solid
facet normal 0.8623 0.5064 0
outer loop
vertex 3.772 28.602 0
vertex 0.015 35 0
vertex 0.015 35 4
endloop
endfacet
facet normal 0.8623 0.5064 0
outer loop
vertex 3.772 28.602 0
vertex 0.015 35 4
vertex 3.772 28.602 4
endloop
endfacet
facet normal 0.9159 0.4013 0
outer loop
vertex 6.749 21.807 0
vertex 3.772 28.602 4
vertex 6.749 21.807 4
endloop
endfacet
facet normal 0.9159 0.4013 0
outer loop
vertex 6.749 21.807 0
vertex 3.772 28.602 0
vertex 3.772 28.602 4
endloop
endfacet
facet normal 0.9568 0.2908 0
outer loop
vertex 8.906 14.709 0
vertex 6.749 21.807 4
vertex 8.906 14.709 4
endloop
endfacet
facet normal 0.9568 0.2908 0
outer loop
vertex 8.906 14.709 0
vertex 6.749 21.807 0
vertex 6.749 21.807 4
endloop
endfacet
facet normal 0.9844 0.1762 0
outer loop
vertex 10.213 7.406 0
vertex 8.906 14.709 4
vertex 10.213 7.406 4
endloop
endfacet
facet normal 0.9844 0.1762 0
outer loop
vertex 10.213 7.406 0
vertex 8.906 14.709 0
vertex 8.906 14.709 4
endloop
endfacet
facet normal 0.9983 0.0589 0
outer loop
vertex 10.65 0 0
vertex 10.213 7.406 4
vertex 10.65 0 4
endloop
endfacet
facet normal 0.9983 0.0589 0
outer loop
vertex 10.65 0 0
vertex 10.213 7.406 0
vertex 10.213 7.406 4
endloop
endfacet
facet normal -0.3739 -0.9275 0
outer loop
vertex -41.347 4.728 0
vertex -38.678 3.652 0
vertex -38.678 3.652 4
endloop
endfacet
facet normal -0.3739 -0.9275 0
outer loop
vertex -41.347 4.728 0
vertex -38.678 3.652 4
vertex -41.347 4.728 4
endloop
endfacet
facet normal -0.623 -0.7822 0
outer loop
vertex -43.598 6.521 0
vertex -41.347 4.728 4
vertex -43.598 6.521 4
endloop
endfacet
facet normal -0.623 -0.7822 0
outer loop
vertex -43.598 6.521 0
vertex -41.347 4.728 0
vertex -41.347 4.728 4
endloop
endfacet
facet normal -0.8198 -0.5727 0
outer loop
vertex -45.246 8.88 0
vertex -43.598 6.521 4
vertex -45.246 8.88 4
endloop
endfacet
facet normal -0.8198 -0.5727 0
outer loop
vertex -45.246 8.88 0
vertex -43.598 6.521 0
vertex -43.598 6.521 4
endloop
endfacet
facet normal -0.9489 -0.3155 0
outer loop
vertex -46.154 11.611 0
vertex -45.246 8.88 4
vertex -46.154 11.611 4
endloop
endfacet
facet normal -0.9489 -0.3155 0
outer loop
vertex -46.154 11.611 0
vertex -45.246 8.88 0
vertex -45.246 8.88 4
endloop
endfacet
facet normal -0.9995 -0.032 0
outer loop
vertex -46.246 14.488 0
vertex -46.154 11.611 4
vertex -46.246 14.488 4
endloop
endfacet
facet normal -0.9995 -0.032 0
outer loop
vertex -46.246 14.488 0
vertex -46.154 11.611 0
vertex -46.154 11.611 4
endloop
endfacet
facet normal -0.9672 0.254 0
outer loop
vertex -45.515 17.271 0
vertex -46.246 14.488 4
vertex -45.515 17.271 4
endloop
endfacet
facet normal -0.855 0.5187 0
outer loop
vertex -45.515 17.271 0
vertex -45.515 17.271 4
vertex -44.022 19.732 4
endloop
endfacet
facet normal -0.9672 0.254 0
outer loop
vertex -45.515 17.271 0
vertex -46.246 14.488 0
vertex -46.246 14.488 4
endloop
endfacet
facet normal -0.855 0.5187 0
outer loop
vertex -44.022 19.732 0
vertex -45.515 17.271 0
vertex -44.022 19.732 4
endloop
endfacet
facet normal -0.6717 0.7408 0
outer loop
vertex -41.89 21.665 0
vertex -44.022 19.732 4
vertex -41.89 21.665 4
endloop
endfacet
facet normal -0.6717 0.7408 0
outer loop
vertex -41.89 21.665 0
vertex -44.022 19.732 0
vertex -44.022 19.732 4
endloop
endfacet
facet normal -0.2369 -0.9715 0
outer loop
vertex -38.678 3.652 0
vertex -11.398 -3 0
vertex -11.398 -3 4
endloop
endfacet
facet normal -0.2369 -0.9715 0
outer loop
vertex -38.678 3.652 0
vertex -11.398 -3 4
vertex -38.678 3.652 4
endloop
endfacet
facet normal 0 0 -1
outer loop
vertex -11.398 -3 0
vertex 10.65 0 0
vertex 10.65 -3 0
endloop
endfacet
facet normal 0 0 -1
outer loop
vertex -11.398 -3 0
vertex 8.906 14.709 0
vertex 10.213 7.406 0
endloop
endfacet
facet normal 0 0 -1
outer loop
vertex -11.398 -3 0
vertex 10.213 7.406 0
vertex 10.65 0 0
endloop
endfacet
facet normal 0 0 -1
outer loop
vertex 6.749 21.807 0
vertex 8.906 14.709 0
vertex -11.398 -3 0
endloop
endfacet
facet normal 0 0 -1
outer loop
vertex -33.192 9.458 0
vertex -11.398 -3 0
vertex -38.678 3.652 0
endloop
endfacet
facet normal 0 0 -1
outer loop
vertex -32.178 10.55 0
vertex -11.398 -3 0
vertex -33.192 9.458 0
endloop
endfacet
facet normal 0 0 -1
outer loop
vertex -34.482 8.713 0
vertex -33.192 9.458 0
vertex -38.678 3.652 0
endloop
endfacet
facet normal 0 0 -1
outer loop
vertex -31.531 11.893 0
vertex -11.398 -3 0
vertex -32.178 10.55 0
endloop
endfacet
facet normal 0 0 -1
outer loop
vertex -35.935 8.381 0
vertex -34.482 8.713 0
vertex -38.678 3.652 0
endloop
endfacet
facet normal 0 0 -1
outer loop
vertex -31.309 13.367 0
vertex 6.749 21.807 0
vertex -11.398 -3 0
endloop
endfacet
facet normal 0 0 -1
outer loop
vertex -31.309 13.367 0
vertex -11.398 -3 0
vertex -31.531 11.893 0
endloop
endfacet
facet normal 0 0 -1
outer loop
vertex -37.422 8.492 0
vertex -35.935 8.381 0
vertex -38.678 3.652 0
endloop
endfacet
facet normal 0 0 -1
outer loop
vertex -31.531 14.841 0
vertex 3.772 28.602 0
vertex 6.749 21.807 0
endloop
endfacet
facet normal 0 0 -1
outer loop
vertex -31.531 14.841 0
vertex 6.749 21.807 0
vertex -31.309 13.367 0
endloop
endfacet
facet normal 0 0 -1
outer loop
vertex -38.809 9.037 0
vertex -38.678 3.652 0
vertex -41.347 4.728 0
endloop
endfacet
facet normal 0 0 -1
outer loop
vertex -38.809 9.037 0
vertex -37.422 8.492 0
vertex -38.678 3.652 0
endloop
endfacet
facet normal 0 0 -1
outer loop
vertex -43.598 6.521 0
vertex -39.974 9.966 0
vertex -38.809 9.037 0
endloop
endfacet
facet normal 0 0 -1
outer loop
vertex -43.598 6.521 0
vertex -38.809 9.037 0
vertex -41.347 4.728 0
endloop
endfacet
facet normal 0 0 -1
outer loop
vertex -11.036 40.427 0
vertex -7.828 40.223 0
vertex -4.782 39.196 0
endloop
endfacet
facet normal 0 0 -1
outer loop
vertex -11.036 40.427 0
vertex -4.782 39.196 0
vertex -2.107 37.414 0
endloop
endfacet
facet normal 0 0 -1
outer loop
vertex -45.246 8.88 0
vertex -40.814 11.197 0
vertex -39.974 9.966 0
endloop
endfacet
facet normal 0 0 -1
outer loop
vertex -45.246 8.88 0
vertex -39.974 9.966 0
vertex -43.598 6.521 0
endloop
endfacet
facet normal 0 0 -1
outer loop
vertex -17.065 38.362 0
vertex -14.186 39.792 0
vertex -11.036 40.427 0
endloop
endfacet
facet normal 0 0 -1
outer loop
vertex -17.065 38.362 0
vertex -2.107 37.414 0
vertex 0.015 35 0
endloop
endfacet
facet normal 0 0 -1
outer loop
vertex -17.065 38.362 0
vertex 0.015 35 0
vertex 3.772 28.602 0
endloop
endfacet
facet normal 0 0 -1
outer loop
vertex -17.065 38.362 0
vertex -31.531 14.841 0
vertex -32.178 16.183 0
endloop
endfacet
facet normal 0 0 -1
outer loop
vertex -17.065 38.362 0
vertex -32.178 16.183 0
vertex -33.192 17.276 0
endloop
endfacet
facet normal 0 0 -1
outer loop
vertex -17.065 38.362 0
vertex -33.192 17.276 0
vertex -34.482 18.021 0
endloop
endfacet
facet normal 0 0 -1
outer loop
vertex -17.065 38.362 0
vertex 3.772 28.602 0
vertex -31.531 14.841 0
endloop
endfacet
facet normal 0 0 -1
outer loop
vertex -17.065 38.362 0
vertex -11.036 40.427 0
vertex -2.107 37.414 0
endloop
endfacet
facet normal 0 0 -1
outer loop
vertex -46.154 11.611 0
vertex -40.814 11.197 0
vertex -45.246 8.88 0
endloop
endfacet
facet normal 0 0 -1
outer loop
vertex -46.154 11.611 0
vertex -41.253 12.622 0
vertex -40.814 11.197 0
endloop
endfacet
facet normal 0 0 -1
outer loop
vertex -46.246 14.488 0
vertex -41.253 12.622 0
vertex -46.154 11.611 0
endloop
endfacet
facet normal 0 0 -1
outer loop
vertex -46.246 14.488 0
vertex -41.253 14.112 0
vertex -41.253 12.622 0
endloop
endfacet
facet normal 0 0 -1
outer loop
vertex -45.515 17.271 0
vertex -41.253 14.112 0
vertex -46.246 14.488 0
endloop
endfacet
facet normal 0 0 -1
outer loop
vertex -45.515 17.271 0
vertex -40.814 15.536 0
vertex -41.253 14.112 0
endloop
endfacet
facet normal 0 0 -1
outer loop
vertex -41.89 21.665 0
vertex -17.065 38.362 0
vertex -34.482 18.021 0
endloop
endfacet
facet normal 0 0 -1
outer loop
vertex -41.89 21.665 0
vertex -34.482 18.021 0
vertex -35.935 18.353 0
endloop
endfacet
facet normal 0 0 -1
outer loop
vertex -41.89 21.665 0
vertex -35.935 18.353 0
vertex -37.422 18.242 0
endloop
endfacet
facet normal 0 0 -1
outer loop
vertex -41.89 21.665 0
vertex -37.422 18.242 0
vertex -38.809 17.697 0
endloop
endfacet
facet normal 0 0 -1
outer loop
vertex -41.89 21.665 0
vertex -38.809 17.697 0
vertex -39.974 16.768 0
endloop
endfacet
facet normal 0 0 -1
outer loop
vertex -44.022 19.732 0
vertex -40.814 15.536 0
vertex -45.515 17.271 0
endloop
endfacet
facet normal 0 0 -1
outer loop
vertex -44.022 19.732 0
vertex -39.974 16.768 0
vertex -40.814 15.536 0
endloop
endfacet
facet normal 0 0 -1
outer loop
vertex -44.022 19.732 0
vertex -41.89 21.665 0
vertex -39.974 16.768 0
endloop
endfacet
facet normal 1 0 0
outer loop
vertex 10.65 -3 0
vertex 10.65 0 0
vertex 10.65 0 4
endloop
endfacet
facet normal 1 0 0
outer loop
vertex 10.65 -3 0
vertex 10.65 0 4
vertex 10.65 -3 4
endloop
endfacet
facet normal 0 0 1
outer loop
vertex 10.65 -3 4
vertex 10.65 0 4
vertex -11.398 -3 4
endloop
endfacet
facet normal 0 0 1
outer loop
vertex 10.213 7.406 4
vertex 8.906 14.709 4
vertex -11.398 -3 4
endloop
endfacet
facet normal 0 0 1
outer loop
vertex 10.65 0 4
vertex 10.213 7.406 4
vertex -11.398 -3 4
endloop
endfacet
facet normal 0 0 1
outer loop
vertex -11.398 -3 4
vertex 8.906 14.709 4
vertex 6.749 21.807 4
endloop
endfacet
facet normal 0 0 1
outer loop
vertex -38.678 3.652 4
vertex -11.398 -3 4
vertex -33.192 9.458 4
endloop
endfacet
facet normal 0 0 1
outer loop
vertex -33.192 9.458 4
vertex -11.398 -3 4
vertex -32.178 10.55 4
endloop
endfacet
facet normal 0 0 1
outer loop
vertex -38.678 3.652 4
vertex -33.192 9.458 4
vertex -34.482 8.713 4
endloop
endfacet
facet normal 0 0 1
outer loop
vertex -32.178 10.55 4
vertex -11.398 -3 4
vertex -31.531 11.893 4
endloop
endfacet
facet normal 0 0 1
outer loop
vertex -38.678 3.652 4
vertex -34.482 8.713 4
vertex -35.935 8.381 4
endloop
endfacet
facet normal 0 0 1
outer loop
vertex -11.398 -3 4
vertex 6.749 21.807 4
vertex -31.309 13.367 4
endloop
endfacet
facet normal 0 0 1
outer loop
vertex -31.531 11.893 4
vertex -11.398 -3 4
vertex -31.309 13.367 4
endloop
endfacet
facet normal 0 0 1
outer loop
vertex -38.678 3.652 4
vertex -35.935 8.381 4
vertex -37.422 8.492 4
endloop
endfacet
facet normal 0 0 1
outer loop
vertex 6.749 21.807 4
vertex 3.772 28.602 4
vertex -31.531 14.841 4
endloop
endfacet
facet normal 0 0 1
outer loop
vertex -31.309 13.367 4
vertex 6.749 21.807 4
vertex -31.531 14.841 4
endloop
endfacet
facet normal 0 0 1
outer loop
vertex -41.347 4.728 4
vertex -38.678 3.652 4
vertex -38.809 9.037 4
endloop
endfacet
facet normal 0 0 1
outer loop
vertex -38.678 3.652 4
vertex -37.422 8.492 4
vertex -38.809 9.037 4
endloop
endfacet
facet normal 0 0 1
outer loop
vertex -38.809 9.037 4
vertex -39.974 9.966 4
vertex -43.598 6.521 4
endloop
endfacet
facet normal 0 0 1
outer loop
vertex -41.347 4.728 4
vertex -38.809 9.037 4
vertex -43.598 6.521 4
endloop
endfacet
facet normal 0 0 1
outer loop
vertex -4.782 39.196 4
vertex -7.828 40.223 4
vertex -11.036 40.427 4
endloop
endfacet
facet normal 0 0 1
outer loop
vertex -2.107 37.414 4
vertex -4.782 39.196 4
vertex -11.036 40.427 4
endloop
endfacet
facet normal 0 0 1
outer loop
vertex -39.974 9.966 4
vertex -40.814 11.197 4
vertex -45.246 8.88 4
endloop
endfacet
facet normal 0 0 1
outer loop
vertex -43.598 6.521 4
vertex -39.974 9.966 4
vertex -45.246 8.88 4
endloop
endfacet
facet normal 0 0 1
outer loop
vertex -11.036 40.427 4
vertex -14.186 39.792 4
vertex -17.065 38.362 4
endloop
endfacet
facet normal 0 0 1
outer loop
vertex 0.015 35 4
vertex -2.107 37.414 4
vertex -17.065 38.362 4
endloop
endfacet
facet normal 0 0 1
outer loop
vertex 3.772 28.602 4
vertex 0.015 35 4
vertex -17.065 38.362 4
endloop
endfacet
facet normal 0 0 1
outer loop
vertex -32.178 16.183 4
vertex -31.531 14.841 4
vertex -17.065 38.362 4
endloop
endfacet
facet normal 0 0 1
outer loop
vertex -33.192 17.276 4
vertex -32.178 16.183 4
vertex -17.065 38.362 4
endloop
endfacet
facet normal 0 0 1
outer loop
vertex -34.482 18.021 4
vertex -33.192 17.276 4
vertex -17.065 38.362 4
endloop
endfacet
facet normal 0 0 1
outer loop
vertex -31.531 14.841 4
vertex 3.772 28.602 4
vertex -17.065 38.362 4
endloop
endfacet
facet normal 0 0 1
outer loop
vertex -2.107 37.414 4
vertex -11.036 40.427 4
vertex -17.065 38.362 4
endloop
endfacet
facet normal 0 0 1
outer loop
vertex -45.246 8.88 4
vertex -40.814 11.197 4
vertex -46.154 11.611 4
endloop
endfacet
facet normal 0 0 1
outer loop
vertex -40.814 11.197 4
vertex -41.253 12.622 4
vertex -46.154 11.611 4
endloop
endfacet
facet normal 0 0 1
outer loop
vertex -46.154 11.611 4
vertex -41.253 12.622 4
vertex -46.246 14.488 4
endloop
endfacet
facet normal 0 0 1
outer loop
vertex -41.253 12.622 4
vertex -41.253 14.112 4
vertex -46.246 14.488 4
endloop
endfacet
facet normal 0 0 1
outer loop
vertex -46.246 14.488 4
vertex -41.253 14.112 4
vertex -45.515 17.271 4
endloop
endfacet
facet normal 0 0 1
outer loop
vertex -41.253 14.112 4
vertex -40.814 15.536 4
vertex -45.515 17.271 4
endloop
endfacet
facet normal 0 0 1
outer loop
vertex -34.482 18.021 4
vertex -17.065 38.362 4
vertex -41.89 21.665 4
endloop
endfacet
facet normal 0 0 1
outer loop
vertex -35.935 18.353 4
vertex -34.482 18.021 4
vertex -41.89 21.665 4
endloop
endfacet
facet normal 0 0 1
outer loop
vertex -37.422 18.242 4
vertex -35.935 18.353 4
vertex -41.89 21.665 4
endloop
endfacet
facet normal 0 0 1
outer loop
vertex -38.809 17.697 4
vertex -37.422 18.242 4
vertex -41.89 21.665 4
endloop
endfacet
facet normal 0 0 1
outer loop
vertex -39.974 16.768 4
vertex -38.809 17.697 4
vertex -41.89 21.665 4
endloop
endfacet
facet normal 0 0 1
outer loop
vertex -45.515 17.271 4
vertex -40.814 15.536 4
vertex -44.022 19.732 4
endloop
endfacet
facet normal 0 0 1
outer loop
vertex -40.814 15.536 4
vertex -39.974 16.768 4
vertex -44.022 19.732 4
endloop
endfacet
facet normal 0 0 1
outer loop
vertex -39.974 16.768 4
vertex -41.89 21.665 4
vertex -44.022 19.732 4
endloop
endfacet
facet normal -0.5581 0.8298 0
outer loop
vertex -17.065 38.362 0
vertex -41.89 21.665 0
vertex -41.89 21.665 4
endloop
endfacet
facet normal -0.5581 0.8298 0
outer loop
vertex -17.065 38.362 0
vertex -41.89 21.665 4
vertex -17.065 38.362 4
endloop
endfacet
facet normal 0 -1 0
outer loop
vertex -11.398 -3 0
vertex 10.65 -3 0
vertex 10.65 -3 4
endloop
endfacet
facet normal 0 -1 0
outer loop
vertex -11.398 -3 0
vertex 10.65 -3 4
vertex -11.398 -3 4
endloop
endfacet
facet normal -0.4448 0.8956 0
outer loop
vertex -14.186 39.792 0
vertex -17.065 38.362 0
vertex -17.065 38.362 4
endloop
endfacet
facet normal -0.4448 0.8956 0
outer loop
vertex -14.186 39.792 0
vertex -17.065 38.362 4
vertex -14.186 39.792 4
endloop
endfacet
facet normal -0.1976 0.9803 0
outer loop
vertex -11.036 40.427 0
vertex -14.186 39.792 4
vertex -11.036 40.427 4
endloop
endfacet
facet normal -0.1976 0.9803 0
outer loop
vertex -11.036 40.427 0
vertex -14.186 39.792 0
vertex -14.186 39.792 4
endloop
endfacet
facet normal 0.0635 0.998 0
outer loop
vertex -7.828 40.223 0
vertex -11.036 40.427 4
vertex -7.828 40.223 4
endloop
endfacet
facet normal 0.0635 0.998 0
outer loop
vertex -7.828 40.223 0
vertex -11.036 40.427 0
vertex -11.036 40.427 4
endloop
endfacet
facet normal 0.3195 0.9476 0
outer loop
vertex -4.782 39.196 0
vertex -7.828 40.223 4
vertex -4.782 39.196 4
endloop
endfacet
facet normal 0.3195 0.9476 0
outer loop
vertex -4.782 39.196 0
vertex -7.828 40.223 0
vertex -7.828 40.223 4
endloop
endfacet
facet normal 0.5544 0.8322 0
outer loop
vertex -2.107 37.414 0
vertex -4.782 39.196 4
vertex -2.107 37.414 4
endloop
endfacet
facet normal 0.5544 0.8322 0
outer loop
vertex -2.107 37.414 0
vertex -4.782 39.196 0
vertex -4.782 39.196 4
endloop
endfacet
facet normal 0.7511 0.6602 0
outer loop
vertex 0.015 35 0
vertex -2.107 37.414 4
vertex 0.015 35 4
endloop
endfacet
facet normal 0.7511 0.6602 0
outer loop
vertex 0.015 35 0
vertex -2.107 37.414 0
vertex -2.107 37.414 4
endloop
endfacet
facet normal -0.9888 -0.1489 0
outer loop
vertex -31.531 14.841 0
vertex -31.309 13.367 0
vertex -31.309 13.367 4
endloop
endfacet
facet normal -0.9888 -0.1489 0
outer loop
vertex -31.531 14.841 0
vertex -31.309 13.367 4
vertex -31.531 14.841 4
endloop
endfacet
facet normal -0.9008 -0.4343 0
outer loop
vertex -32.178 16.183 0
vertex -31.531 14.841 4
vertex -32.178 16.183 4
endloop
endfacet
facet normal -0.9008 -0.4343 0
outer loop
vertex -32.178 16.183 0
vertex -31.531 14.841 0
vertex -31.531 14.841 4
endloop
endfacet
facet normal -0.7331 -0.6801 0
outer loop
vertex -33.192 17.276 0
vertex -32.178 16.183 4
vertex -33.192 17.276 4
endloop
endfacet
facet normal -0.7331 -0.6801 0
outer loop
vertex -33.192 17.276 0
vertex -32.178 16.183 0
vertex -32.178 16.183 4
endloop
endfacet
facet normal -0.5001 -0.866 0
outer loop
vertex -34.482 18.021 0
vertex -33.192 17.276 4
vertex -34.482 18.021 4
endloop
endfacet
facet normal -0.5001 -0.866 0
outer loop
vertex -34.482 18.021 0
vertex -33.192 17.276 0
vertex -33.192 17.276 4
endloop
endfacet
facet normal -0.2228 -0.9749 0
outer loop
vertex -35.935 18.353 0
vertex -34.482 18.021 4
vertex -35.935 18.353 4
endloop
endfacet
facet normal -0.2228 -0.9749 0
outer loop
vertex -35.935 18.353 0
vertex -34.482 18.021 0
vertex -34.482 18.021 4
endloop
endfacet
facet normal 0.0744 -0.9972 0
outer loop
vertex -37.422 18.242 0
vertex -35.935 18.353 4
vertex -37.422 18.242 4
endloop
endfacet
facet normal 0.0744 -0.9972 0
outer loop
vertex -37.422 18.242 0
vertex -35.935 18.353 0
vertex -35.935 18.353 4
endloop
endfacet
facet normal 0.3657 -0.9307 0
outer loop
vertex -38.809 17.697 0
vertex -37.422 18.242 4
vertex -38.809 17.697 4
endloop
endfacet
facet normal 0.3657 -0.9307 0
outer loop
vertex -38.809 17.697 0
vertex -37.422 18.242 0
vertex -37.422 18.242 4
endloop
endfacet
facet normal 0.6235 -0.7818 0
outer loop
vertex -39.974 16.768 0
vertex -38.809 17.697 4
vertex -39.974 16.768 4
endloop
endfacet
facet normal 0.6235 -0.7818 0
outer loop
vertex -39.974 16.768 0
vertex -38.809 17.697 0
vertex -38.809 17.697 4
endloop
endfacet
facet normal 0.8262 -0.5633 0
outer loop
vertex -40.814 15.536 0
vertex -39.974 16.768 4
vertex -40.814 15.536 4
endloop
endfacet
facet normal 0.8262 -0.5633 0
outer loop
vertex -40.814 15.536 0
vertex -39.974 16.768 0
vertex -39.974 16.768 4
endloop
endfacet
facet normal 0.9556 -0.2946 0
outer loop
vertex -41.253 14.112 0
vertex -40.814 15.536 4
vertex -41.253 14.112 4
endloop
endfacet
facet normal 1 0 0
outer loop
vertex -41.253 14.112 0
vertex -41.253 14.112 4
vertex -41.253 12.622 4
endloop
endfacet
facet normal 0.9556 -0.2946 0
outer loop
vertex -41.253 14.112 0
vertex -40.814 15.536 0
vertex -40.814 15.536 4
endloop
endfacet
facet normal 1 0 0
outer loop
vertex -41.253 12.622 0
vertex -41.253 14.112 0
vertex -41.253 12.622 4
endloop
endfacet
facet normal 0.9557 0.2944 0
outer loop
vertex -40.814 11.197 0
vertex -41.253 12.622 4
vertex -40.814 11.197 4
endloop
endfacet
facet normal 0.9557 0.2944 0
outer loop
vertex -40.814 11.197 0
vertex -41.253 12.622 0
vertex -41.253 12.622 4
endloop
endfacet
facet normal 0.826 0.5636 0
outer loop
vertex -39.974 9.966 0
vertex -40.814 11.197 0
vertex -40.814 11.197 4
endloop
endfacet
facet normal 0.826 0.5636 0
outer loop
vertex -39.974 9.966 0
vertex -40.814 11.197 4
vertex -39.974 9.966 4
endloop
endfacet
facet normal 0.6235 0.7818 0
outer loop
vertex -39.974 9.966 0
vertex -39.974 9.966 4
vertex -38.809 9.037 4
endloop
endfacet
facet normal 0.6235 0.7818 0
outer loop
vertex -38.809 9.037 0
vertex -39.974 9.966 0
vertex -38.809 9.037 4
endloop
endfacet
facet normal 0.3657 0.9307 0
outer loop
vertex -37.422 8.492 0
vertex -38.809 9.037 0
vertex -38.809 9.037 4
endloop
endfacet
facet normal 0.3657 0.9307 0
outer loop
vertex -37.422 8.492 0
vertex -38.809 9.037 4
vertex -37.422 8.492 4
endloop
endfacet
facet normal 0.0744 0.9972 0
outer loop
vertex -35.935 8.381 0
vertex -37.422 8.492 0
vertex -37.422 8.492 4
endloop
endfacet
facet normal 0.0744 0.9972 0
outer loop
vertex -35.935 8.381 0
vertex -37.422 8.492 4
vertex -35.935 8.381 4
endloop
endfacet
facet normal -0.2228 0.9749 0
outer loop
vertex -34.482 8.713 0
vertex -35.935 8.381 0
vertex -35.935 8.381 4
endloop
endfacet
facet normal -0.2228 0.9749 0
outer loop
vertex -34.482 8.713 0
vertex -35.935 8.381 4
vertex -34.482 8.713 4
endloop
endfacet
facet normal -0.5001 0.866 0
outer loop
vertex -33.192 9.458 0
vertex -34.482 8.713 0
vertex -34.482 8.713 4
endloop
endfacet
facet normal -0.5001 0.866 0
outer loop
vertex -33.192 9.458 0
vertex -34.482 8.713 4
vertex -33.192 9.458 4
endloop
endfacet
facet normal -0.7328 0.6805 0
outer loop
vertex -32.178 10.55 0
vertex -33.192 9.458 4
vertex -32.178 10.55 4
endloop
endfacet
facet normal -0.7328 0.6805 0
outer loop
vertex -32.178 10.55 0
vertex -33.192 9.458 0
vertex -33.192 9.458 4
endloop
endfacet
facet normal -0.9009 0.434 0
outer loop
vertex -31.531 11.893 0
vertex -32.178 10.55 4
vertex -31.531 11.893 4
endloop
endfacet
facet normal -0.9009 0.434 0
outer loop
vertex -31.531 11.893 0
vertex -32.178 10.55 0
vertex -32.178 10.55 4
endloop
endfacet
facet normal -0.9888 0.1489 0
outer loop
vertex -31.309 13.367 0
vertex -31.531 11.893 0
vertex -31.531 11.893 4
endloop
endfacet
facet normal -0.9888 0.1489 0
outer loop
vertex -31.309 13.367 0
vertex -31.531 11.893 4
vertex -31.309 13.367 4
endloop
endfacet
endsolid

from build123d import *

# Parameters (mm, degrees)
SKETCH_1_R      = 5
EXTRUDE_1_DEPTH = 4


with BuildPart() as part:
    # Эскиз1 → Бобышка-Вытянуть1 (new body)
    with BuildSketch(Plane.XY):
        with BuildLine():
            Line((10.65, 0), (10.65, -3))
            Line((10.65, -3), (-11.397789553, -3))
            Line((-11.397789553, -3), (-38.677904755, 3.651503117))
            ThreePointArc((-38.677904755, 3.651503117), (-46.153775079, 11.6113462), (-41.890065439, 21.664630197))
            Line((-41.890065439, 21.664630197), (-17.065107401, 38.361673869))
            ThreePointArc((-17.065107401, 38.361673869), (-7.827814909, 40.223299164), (0.014835138, 34.999692982))
            ThreePointArc((0.014835138, 34.999692982), (7.932514626, 18.289923732), (10.65, 0))
        make_face()
        with Locations((-36.309076923, 13.366885492)):
            Circle(SKETCH_1_R, mode=Mode.SUBTRACT)
    extrude(amount=EXTRUDE_1_DEPTH)


solid = part.part
